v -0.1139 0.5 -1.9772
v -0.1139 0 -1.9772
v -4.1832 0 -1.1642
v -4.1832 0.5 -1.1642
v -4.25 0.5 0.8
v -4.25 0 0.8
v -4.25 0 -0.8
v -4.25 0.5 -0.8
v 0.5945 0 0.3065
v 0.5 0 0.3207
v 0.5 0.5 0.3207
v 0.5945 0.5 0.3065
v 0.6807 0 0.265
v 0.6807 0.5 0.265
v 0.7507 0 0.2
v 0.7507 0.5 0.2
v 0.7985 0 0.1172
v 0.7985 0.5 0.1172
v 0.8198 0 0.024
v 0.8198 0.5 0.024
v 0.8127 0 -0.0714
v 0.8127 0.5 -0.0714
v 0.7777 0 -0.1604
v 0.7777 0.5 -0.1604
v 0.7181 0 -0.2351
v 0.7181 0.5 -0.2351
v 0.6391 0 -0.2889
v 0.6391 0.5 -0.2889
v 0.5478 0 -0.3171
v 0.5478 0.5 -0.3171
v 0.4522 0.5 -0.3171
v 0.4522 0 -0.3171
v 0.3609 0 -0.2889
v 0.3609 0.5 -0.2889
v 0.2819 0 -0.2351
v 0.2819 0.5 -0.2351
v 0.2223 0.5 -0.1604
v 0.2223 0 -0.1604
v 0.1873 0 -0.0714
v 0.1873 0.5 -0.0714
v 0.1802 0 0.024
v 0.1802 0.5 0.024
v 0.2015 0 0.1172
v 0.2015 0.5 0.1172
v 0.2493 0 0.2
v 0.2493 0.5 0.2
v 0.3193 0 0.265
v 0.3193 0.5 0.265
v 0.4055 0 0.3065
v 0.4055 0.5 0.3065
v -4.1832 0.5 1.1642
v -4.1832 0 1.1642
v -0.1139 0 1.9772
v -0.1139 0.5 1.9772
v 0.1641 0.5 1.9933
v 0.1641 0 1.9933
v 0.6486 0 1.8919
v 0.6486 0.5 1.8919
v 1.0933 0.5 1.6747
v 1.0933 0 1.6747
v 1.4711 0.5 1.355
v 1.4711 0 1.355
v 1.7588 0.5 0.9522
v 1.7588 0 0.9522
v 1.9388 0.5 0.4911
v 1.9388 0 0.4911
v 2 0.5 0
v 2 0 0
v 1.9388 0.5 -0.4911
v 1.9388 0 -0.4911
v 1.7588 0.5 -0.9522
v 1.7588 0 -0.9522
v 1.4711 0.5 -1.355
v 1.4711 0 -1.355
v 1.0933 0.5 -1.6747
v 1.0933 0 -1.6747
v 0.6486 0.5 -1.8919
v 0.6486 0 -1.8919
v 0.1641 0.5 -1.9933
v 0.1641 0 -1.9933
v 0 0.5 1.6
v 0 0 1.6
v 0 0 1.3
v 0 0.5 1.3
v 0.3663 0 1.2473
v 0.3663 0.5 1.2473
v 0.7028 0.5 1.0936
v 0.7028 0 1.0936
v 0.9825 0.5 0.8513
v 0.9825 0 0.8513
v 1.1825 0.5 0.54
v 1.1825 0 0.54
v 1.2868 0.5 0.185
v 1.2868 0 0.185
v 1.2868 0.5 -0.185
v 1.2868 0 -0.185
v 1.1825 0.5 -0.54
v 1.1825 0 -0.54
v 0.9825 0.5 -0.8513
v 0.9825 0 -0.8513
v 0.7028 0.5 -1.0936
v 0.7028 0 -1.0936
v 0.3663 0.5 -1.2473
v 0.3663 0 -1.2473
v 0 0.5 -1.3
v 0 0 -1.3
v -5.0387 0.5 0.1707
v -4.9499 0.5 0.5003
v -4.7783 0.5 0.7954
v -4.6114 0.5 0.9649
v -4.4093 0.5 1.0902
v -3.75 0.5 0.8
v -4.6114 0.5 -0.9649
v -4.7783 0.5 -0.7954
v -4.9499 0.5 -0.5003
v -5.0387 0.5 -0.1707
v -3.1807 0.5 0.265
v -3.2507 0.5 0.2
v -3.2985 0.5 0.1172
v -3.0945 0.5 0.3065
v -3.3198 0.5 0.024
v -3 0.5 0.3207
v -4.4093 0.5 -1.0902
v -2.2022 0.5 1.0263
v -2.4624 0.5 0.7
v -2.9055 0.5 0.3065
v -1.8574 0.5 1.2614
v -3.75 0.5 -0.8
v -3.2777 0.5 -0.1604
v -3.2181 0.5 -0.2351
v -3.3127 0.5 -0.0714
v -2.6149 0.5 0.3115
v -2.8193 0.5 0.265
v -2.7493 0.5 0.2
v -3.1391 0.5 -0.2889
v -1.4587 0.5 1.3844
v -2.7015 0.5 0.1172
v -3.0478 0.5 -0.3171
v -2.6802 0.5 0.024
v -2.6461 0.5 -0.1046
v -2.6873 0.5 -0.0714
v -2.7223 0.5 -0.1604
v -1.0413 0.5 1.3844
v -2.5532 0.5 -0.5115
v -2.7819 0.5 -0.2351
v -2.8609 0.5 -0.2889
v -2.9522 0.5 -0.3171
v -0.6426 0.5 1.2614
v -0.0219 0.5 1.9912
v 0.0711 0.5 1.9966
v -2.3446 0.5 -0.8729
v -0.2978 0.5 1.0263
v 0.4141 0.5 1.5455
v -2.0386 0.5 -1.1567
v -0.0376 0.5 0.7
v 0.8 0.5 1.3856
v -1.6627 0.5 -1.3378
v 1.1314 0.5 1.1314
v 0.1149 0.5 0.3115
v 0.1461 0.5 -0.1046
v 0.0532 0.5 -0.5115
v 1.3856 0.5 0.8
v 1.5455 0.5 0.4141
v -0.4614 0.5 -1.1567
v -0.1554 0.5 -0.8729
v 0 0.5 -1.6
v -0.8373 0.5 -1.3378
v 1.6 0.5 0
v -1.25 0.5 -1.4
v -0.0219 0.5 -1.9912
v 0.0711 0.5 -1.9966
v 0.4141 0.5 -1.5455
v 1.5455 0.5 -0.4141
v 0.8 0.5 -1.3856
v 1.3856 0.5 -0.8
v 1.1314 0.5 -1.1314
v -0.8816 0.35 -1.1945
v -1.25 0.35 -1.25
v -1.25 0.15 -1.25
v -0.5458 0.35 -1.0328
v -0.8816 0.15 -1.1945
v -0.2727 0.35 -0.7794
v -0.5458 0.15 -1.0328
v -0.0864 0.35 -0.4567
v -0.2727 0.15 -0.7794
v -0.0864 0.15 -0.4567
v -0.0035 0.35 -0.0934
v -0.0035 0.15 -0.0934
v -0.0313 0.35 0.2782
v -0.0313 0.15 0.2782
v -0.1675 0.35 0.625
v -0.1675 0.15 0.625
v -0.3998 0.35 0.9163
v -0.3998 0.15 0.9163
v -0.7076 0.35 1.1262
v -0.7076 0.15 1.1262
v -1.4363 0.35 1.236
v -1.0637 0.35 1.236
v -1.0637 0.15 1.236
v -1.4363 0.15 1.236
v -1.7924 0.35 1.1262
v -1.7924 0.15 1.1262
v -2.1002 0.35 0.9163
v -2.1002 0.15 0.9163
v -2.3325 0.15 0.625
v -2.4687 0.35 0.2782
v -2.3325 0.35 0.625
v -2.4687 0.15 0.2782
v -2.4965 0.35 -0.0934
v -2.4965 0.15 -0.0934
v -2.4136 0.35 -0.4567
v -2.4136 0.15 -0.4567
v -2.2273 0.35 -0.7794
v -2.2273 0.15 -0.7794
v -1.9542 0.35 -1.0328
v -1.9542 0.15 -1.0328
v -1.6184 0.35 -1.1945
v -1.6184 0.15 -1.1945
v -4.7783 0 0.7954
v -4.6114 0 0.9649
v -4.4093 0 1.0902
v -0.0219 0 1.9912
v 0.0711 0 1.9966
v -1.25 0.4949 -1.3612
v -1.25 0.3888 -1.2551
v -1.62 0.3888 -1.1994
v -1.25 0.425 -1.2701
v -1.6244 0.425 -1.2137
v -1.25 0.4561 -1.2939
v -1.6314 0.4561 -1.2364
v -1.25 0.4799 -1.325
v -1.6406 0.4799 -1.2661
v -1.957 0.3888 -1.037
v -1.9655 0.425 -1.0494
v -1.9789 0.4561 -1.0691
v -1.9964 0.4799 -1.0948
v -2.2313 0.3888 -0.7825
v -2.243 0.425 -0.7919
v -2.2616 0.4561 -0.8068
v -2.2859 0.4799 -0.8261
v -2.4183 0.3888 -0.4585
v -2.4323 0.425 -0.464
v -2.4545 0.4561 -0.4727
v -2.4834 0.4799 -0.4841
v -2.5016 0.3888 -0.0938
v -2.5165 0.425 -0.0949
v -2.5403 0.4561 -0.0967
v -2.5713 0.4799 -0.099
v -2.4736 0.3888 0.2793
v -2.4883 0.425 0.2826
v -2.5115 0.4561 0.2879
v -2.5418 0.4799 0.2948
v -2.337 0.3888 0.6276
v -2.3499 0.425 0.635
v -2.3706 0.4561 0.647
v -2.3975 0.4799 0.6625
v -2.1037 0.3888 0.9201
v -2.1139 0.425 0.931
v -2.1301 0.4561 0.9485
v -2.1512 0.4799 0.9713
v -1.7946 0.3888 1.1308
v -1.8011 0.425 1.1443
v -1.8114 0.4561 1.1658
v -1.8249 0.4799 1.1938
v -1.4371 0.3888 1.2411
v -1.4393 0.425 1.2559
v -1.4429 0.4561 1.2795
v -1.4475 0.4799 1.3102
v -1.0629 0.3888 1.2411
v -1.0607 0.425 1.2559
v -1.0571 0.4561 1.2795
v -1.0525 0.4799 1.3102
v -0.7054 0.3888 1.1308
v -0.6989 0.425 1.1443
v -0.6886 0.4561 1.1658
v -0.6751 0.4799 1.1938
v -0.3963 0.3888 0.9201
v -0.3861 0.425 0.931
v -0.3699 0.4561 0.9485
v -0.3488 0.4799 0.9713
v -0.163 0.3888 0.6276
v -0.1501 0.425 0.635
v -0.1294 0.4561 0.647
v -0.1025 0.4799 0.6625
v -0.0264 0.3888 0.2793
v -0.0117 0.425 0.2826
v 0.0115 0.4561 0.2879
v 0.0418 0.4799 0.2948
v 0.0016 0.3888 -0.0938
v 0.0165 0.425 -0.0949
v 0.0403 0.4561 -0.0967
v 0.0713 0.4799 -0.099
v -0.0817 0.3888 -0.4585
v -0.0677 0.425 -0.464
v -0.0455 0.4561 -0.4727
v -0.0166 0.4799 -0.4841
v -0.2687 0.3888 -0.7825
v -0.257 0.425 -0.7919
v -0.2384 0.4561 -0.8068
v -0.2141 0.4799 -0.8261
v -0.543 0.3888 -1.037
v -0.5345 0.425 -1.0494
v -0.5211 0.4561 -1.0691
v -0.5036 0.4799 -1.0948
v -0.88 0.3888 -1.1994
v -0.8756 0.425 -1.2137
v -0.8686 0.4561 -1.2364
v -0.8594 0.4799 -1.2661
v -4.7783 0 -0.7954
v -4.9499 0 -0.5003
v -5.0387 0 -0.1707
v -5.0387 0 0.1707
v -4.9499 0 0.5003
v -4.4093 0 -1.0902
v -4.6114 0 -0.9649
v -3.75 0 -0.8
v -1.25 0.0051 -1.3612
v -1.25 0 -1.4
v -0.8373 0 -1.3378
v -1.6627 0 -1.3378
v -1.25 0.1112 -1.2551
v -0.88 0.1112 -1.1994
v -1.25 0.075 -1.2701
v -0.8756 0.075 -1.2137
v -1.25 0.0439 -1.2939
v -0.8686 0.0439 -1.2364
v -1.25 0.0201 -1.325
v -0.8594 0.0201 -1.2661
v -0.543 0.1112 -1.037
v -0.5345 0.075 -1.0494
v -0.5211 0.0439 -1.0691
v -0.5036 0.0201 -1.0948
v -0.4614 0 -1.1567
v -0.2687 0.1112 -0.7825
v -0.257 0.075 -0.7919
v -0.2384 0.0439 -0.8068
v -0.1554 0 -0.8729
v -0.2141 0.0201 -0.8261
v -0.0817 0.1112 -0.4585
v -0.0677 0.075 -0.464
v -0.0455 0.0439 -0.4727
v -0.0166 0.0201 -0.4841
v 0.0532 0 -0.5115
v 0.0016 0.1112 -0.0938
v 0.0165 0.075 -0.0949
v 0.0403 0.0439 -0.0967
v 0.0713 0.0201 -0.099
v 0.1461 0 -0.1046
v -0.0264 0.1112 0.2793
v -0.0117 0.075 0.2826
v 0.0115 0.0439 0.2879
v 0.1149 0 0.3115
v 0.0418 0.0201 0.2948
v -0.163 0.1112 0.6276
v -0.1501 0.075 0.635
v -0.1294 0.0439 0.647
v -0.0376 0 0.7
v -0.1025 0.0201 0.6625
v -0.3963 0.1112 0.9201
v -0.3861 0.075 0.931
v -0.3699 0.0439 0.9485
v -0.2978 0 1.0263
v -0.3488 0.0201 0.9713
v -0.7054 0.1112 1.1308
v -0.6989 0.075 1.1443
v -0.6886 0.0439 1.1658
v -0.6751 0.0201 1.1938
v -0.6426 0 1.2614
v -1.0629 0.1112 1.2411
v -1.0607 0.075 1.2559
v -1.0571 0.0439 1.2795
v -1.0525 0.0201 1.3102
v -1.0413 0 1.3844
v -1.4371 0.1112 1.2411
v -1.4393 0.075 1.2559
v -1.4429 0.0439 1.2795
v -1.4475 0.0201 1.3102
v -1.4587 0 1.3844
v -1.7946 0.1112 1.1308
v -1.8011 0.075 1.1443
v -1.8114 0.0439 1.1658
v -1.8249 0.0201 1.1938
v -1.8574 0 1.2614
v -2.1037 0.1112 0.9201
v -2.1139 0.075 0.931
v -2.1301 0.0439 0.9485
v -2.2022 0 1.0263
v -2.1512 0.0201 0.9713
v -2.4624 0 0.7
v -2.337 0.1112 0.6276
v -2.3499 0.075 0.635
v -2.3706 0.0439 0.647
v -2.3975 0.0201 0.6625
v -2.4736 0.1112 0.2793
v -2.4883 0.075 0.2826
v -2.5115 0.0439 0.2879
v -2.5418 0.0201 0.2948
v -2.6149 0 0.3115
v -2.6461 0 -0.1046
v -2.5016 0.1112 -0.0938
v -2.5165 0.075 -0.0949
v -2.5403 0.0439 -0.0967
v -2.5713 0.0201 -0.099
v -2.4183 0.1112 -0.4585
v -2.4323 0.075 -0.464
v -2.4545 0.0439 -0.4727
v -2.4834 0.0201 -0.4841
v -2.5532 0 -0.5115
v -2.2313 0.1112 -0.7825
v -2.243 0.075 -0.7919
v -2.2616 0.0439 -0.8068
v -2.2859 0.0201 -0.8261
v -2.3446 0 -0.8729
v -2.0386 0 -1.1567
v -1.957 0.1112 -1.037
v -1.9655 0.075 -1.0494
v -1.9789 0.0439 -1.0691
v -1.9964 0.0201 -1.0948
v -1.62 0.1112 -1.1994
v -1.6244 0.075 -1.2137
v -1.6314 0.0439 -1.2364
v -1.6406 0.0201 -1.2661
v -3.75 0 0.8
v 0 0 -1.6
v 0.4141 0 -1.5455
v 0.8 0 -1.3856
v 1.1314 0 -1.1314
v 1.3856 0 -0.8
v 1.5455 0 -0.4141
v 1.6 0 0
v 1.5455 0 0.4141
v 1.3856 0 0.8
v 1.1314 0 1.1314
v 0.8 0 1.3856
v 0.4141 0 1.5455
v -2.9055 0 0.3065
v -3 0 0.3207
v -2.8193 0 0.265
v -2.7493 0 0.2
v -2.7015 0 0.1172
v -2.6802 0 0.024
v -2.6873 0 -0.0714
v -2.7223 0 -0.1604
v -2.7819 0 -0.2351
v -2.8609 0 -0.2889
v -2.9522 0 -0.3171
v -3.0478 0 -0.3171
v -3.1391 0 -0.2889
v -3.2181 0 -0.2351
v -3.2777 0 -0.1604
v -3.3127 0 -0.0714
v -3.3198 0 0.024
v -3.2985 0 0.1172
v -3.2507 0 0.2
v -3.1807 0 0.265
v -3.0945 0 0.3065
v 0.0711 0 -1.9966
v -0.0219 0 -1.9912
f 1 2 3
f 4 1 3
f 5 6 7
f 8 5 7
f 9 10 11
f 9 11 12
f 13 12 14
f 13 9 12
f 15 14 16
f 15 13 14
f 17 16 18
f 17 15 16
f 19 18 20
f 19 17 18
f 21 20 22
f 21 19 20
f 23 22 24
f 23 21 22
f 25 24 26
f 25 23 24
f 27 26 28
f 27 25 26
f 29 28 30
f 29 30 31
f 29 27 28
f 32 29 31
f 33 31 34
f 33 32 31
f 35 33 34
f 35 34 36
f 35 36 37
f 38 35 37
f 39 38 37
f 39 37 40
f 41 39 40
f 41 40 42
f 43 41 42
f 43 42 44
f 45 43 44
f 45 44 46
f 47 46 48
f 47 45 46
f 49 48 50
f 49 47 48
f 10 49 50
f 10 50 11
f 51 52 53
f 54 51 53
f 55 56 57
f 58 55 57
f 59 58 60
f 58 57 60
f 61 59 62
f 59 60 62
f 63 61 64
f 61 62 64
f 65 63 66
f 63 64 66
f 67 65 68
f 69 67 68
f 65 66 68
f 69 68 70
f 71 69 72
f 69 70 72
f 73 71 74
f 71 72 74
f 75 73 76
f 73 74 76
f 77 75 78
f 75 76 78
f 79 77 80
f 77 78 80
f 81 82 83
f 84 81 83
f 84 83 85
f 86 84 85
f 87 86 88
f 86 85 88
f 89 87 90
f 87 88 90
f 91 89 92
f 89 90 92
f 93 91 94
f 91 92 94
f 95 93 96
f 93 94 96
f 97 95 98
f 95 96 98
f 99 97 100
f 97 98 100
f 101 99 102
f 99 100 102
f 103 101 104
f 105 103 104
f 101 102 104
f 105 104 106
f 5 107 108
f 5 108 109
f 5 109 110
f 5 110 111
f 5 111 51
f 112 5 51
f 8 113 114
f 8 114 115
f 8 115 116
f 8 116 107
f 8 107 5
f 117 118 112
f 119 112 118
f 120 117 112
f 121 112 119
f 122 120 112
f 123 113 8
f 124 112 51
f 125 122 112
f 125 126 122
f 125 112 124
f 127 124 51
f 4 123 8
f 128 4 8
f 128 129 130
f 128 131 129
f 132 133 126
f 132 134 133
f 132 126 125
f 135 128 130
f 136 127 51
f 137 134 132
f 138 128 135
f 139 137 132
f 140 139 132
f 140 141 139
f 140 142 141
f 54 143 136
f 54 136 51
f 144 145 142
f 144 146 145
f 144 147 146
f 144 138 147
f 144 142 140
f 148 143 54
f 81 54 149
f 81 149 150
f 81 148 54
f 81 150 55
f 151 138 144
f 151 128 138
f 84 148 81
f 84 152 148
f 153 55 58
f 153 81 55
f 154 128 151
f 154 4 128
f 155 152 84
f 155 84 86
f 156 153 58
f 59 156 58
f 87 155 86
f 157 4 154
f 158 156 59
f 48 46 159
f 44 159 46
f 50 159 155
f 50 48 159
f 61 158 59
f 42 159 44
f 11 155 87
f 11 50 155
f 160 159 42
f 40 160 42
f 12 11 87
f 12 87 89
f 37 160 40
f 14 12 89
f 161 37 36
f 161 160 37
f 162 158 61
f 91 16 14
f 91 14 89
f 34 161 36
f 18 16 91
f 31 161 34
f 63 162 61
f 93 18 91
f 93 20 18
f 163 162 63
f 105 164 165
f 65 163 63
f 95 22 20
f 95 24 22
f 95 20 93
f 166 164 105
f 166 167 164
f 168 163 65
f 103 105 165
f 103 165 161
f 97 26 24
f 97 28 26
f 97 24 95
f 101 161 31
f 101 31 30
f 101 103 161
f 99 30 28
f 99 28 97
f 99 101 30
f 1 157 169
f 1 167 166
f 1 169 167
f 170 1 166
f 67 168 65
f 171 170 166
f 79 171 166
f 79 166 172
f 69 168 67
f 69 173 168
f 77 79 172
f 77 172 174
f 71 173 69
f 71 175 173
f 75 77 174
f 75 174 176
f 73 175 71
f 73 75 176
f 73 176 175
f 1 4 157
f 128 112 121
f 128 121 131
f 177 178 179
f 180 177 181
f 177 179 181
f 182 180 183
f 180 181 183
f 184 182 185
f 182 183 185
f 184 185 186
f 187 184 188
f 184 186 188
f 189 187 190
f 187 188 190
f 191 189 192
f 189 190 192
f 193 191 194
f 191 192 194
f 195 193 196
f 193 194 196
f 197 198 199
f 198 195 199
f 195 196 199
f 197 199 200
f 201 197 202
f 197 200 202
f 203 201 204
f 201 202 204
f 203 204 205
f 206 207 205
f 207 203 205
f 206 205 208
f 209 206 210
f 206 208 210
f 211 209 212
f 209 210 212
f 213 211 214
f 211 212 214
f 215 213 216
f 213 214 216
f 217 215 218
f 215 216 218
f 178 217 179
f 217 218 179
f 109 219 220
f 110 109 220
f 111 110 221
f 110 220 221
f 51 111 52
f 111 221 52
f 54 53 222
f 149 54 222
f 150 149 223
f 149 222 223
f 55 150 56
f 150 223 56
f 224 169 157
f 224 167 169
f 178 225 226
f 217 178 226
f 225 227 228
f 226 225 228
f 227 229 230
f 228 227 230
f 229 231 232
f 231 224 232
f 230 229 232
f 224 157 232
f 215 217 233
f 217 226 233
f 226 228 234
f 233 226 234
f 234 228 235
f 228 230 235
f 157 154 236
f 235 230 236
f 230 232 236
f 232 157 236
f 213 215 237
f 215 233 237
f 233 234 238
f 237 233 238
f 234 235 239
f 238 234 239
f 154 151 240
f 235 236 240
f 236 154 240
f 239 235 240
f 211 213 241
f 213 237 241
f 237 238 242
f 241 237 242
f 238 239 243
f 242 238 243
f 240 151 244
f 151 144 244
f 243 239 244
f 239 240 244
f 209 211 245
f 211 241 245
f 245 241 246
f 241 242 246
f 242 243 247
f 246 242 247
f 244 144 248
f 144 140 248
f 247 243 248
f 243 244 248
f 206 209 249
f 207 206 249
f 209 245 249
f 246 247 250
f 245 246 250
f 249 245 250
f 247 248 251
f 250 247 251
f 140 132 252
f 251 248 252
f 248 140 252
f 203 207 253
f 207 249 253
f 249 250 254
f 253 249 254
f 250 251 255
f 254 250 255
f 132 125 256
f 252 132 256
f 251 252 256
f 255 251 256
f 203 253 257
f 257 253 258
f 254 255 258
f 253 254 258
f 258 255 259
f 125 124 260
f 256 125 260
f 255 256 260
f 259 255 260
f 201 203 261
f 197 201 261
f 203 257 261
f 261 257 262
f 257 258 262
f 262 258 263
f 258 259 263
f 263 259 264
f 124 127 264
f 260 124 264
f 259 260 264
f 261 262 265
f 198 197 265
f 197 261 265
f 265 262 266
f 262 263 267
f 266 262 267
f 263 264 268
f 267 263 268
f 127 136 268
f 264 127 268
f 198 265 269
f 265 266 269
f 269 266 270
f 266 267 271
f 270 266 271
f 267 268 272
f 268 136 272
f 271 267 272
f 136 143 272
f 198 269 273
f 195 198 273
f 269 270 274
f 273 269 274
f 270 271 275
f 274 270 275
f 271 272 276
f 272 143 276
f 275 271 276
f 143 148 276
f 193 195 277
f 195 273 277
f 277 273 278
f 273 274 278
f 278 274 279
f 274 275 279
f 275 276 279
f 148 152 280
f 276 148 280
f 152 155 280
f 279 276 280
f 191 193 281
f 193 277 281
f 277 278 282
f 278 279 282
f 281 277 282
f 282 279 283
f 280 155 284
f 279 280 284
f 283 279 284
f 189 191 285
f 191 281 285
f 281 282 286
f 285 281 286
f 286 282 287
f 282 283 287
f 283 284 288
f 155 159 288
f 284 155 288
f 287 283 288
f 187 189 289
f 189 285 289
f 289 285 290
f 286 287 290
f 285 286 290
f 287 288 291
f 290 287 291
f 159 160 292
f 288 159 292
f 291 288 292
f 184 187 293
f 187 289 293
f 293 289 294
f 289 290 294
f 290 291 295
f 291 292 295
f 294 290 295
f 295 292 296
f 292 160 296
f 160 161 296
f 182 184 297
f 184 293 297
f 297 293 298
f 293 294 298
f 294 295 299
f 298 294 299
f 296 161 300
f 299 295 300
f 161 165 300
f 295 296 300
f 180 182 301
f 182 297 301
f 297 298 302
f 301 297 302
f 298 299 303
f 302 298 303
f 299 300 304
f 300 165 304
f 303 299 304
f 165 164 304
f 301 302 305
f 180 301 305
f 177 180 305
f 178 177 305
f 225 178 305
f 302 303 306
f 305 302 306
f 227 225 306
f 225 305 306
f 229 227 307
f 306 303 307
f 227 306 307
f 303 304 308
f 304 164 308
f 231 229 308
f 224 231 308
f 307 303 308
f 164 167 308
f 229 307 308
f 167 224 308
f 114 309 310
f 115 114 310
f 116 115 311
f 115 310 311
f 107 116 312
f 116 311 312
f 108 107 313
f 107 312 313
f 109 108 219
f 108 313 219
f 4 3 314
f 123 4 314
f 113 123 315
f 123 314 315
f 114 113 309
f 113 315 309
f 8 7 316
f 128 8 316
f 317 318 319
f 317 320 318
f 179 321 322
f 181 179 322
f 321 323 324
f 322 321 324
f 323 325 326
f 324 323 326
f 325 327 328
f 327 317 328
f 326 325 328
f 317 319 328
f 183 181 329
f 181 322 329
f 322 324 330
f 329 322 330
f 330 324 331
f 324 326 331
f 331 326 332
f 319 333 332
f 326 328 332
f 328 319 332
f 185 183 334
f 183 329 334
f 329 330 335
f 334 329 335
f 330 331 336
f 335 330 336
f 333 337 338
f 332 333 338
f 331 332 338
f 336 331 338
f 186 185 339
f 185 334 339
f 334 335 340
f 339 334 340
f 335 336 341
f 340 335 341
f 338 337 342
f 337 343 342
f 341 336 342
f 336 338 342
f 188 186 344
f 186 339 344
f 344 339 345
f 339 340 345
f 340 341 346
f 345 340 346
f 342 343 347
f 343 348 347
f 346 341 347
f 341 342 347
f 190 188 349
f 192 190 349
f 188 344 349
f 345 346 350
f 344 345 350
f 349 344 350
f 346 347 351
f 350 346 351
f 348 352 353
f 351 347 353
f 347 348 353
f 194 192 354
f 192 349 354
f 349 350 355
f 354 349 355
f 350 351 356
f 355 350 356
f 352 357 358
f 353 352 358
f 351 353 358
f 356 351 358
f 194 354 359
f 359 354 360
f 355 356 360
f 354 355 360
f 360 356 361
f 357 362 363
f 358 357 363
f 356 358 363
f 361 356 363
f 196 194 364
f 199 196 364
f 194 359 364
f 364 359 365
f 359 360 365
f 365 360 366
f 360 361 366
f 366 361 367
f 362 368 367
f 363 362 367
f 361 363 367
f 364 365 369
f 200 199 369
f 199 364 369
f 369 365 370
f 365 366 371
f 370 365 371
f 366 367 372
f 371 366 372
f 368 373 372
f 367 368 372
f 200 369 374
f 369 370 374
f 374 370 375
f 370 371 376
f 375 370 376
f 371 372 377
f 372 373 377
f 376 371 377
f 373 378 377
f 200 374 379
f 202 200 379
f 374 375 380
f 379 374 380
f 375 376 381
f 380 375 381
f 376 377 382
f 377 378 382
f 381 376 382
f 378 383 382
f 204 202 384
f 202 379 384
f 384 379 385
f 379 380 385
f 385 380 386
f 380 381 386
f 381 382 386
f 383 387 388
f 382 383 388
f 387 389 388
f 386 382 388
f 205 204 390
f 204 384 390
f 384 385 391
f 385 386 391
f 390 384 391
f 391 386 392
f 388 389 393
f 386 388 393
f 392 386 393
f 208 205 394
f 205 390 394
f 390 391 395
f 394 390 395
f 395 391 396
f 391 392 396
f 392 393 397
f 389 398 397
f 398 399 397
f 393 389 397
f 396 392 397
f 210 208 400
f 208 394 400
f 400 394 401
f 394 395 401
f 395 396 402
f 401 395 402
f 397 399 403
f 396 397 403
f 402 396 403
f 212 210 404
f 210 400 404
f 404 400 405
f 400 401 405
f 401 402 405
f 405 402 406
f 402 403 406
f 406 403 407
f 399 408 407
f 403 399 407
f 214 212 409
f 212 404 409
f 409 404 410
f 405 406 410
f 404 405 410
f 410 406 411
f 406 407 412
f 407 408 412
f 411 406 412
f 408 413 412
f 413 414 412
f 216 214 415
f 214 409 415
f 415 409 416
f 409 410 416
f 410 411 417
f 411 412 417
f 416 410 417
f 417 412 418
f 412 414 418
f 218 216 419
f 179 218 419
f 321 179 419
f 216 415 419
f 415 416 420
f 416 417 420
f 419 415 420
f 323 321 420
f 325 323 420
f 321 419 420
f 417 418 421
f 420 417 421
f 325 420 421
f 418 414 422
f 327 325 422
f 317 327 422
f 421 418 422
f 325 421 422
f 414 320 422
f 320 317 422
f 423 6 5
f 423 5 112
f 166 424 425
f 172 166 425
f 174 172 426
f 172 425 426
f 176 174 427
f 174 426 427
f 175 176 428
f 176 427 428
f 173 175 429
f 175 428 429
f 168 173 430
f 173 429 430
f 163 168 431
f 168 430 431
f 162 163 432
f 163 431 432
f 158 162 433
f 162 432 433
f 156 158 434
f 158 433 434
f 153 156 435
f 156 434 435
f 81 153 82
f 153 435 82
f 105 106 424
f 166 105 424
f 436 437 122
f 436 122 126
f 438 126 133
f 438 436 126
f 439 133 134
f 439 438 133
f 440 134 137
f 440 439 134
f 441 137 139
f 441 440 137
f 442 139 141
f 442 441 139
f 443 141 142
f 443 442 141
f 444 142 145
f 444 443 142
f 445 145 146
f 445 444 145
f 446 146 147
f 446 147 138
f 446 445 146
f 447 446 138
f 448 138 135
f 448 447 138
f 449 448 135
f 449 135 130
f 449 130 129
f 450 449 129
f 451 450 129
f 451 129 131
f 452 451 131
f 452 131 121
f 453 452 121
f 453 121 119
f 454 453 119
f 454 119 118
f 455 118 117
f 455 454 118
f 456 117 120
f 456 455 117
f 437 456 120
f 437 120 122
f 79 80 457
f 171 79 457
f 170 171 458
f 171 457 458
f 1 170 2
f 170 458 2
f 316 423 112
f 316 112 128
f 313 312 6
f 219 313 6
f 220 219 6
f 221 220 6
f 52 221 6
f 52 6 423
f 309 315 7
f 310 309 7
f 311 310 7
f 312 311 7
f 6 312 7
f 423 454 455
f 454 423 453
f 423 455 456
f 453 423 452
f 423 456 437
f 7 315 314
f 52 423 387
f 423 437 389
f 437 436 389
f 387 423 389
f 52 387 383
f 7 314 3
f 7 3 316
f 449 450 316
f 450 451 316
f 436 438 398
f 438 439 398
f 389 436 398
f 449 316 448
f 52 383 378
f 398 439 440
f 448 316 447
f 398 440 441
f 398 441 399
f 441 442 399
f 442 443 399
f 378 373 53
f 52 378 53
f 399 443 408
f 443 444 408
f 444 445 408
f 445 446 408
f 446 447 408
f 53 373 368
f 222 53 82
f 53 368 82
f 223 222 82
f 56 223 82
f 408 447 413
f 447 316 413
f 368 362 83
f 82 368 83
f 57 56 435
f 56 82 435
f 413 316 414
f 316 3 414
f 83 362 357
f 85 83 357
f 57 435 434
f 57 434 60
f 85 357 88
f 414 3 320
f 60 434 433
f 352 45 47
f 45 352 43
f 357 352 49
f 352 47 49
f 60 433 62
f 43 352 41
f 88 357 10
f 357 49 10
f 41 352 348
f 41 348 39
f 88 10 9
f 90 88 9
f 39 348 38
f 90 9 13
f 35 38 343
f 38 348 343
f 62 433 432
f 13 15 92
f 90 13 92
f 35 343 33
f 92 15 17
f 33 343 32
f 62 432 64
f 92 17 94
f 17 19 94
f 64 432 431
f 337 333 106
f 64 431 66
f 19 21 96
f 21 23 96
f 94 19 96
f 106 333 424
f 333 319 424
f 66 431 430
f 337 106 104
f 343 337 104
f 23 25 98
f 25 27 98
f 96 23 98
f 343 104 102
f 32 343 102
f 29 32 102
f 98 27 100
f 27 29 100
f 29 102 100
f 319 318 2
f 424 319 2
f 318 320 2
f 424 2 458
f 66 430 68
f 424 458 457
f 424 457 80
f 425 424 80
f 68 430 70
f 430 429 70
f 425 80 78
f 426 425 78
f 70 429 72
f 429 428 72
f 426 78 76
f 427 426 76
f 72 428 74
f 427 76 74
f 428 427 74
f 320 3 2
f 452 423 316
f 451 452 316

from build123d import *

# Parameters (mm, degrees)
SKETCH1_R           = 0.32069999999999993
SKETCH1_W           = 0.49999999999999956
SKETCH1_H           = 1.6
SKETCH1_R_2         = 0.3207000000000001
BOSS_EXTRUDE1_DEPTH = 0.5
FILLET3_R           = 0.15


with BuildPart() as part:
    # Sketch1 → Boss-Extrude1 (new body)
    # profile 1 of 2: a face of its own
    with BuildSketch(Plane(origin=(0, 0, 0), x_dir=(1, 0, 0), z_dir=(0, 1, 0))):
        with BuildLine():
            ThreePointArc((0.16410089999999872, 1.9932563547231181), (0.02454856527933624, 1.9949735752626254), (-0.11388375906019726, 1.9772452208459481))
            Line((-0.11388375906019724, 1.9772452208459481), (-1.2499999999996807, 1.7502411741825006))
            Line((-1.2499999999996807, 1.7502411741825006), (-1.2499999999996807, 1.2499999999996991))
            ThreePointArc((-1.2499999999996807, 1.2499999999996991), (-0.3661165235167134, 0.8838834764829733), (1.221e-14, 6.11e-15))
            ThreePointArc((1.221e-14, 5.8e-15), (-0.36611652351671364, -0.8838834764829614), (-1.249999999999681, -1.2499999999996867))
            Line((-1.2499999999996807, -1.249999999999687), (-1.2499999999996805, -1.7502411741825006))
            Line((-1.2499999999996805, -1.7502411741825006), (-0.11388375997143456, -1.9772452206638764))
            ThreePointArc((-0.11388375997143454, -1.9772452206638764), (0.02454856391169549, -1.9949735750542663), (0.16410089817752455, -1.9932563546160664))
            ThreePointArc((0.16410089817752457, -1.9932563546160669), (2.0000000001183995, -7.8577381e-10), (0.16410089999999872, 1.9932563547231181))
        make_face()
        with Locations(Location((0.5, 0, 0), (0, 0, 270))):
            Circle(SKETCH1_R, mode=Mode.SUBTRACT)
        with BuildLine():
            Line((-1.058207e-11, 1.3000000001285459), (-1.058197e-11, 1.6000000001285462))
            ThreePointArc((-1.058197e-11, 1.6000000001285457), (1.5999999999894177, 1.2854606e-10), (-1.058164e-11, -1.599999999871454))
            Line((-1.058197e-11, -1.599999999871454), (-1.058207e-11, -1.299999999871454))
            ThreePointArc((-1.058171e-11, -1.299999999871454), (1.2999999999894176, 1.2854607e-10), (-1.058207e-11, 1.3000000001285457))
        make_face(mode=Mode.SUBTRACT)
    # profile 2 of 2: a face of its own
    with BuildSketch(Plane(origin=(0, 0, 0), x_dir=(1, 0, 0), z_dir=(0, 1, 0))):
        with BuildLine():
            Line((-1.2499999999996807, 1.2499999999996991), (-1.2499999999996807, 1.7502411741825006))
            Line((-1.2499999999996807, 1.7502411741825006), (-4.1832356905240005, 1.1641599726532808))
            ThreePointArc((-4.1832356905240005, 1.1641599726532808), (-4.514100230865791, 1.0335329749029736), (-4.778306419676481, 0.7953526936222303))
            ThreePointArc((-4.778306419676481, 0.7953526936222305), (-5.05, -4.7e-16), (-4.778306419676481, -0.7953526936222314))
            ThreePointArc((-4.778306419676481, -0.7953526936222312), (-4.514100230865791, -1.033532974902974), (-4.1832356905240005, -1.1641599726532812))
            Line((-4.1832356905240005, -1.164159972653281), (-1.2499999999996805, -1.7502411741825006))
            Line((-1.2499999999996805, -1.7502411741825006), (-1.2499999999996807, -1.249999999999687))
            ThreePointArc((-1.249999999999681, -1.2499999999996867), (-2.499999999999374, 6.26e-15), (-1.2499999999996807, 1.2499999999996991))
        make_face()
        with Locations((-4, 0)):
            Rectangle(SKETCH1_W, SKETCH1_H, mode=Mode.SUBTRACT)
        with Locations(Location((-3, 0, 0), (0, 0, 270))):
            Circle(SKETCH1_R_2, mode=Mode.SUBTRACT)
    extrude(amount=BOSS_EXTRUDE1_DEPTH)

    # Fillet3
    fillet3_edges = [part.edges().sort_by_distance(p)[0] for p in [
        (-1.2499999999996816, 0, 1.2499999999996865),
        (-1.2499999999996807, 0.5, 1.249999999999687),
    ]]
    fillet(fillet3_edges, radius=FILLET3_R)


solid = part.part
